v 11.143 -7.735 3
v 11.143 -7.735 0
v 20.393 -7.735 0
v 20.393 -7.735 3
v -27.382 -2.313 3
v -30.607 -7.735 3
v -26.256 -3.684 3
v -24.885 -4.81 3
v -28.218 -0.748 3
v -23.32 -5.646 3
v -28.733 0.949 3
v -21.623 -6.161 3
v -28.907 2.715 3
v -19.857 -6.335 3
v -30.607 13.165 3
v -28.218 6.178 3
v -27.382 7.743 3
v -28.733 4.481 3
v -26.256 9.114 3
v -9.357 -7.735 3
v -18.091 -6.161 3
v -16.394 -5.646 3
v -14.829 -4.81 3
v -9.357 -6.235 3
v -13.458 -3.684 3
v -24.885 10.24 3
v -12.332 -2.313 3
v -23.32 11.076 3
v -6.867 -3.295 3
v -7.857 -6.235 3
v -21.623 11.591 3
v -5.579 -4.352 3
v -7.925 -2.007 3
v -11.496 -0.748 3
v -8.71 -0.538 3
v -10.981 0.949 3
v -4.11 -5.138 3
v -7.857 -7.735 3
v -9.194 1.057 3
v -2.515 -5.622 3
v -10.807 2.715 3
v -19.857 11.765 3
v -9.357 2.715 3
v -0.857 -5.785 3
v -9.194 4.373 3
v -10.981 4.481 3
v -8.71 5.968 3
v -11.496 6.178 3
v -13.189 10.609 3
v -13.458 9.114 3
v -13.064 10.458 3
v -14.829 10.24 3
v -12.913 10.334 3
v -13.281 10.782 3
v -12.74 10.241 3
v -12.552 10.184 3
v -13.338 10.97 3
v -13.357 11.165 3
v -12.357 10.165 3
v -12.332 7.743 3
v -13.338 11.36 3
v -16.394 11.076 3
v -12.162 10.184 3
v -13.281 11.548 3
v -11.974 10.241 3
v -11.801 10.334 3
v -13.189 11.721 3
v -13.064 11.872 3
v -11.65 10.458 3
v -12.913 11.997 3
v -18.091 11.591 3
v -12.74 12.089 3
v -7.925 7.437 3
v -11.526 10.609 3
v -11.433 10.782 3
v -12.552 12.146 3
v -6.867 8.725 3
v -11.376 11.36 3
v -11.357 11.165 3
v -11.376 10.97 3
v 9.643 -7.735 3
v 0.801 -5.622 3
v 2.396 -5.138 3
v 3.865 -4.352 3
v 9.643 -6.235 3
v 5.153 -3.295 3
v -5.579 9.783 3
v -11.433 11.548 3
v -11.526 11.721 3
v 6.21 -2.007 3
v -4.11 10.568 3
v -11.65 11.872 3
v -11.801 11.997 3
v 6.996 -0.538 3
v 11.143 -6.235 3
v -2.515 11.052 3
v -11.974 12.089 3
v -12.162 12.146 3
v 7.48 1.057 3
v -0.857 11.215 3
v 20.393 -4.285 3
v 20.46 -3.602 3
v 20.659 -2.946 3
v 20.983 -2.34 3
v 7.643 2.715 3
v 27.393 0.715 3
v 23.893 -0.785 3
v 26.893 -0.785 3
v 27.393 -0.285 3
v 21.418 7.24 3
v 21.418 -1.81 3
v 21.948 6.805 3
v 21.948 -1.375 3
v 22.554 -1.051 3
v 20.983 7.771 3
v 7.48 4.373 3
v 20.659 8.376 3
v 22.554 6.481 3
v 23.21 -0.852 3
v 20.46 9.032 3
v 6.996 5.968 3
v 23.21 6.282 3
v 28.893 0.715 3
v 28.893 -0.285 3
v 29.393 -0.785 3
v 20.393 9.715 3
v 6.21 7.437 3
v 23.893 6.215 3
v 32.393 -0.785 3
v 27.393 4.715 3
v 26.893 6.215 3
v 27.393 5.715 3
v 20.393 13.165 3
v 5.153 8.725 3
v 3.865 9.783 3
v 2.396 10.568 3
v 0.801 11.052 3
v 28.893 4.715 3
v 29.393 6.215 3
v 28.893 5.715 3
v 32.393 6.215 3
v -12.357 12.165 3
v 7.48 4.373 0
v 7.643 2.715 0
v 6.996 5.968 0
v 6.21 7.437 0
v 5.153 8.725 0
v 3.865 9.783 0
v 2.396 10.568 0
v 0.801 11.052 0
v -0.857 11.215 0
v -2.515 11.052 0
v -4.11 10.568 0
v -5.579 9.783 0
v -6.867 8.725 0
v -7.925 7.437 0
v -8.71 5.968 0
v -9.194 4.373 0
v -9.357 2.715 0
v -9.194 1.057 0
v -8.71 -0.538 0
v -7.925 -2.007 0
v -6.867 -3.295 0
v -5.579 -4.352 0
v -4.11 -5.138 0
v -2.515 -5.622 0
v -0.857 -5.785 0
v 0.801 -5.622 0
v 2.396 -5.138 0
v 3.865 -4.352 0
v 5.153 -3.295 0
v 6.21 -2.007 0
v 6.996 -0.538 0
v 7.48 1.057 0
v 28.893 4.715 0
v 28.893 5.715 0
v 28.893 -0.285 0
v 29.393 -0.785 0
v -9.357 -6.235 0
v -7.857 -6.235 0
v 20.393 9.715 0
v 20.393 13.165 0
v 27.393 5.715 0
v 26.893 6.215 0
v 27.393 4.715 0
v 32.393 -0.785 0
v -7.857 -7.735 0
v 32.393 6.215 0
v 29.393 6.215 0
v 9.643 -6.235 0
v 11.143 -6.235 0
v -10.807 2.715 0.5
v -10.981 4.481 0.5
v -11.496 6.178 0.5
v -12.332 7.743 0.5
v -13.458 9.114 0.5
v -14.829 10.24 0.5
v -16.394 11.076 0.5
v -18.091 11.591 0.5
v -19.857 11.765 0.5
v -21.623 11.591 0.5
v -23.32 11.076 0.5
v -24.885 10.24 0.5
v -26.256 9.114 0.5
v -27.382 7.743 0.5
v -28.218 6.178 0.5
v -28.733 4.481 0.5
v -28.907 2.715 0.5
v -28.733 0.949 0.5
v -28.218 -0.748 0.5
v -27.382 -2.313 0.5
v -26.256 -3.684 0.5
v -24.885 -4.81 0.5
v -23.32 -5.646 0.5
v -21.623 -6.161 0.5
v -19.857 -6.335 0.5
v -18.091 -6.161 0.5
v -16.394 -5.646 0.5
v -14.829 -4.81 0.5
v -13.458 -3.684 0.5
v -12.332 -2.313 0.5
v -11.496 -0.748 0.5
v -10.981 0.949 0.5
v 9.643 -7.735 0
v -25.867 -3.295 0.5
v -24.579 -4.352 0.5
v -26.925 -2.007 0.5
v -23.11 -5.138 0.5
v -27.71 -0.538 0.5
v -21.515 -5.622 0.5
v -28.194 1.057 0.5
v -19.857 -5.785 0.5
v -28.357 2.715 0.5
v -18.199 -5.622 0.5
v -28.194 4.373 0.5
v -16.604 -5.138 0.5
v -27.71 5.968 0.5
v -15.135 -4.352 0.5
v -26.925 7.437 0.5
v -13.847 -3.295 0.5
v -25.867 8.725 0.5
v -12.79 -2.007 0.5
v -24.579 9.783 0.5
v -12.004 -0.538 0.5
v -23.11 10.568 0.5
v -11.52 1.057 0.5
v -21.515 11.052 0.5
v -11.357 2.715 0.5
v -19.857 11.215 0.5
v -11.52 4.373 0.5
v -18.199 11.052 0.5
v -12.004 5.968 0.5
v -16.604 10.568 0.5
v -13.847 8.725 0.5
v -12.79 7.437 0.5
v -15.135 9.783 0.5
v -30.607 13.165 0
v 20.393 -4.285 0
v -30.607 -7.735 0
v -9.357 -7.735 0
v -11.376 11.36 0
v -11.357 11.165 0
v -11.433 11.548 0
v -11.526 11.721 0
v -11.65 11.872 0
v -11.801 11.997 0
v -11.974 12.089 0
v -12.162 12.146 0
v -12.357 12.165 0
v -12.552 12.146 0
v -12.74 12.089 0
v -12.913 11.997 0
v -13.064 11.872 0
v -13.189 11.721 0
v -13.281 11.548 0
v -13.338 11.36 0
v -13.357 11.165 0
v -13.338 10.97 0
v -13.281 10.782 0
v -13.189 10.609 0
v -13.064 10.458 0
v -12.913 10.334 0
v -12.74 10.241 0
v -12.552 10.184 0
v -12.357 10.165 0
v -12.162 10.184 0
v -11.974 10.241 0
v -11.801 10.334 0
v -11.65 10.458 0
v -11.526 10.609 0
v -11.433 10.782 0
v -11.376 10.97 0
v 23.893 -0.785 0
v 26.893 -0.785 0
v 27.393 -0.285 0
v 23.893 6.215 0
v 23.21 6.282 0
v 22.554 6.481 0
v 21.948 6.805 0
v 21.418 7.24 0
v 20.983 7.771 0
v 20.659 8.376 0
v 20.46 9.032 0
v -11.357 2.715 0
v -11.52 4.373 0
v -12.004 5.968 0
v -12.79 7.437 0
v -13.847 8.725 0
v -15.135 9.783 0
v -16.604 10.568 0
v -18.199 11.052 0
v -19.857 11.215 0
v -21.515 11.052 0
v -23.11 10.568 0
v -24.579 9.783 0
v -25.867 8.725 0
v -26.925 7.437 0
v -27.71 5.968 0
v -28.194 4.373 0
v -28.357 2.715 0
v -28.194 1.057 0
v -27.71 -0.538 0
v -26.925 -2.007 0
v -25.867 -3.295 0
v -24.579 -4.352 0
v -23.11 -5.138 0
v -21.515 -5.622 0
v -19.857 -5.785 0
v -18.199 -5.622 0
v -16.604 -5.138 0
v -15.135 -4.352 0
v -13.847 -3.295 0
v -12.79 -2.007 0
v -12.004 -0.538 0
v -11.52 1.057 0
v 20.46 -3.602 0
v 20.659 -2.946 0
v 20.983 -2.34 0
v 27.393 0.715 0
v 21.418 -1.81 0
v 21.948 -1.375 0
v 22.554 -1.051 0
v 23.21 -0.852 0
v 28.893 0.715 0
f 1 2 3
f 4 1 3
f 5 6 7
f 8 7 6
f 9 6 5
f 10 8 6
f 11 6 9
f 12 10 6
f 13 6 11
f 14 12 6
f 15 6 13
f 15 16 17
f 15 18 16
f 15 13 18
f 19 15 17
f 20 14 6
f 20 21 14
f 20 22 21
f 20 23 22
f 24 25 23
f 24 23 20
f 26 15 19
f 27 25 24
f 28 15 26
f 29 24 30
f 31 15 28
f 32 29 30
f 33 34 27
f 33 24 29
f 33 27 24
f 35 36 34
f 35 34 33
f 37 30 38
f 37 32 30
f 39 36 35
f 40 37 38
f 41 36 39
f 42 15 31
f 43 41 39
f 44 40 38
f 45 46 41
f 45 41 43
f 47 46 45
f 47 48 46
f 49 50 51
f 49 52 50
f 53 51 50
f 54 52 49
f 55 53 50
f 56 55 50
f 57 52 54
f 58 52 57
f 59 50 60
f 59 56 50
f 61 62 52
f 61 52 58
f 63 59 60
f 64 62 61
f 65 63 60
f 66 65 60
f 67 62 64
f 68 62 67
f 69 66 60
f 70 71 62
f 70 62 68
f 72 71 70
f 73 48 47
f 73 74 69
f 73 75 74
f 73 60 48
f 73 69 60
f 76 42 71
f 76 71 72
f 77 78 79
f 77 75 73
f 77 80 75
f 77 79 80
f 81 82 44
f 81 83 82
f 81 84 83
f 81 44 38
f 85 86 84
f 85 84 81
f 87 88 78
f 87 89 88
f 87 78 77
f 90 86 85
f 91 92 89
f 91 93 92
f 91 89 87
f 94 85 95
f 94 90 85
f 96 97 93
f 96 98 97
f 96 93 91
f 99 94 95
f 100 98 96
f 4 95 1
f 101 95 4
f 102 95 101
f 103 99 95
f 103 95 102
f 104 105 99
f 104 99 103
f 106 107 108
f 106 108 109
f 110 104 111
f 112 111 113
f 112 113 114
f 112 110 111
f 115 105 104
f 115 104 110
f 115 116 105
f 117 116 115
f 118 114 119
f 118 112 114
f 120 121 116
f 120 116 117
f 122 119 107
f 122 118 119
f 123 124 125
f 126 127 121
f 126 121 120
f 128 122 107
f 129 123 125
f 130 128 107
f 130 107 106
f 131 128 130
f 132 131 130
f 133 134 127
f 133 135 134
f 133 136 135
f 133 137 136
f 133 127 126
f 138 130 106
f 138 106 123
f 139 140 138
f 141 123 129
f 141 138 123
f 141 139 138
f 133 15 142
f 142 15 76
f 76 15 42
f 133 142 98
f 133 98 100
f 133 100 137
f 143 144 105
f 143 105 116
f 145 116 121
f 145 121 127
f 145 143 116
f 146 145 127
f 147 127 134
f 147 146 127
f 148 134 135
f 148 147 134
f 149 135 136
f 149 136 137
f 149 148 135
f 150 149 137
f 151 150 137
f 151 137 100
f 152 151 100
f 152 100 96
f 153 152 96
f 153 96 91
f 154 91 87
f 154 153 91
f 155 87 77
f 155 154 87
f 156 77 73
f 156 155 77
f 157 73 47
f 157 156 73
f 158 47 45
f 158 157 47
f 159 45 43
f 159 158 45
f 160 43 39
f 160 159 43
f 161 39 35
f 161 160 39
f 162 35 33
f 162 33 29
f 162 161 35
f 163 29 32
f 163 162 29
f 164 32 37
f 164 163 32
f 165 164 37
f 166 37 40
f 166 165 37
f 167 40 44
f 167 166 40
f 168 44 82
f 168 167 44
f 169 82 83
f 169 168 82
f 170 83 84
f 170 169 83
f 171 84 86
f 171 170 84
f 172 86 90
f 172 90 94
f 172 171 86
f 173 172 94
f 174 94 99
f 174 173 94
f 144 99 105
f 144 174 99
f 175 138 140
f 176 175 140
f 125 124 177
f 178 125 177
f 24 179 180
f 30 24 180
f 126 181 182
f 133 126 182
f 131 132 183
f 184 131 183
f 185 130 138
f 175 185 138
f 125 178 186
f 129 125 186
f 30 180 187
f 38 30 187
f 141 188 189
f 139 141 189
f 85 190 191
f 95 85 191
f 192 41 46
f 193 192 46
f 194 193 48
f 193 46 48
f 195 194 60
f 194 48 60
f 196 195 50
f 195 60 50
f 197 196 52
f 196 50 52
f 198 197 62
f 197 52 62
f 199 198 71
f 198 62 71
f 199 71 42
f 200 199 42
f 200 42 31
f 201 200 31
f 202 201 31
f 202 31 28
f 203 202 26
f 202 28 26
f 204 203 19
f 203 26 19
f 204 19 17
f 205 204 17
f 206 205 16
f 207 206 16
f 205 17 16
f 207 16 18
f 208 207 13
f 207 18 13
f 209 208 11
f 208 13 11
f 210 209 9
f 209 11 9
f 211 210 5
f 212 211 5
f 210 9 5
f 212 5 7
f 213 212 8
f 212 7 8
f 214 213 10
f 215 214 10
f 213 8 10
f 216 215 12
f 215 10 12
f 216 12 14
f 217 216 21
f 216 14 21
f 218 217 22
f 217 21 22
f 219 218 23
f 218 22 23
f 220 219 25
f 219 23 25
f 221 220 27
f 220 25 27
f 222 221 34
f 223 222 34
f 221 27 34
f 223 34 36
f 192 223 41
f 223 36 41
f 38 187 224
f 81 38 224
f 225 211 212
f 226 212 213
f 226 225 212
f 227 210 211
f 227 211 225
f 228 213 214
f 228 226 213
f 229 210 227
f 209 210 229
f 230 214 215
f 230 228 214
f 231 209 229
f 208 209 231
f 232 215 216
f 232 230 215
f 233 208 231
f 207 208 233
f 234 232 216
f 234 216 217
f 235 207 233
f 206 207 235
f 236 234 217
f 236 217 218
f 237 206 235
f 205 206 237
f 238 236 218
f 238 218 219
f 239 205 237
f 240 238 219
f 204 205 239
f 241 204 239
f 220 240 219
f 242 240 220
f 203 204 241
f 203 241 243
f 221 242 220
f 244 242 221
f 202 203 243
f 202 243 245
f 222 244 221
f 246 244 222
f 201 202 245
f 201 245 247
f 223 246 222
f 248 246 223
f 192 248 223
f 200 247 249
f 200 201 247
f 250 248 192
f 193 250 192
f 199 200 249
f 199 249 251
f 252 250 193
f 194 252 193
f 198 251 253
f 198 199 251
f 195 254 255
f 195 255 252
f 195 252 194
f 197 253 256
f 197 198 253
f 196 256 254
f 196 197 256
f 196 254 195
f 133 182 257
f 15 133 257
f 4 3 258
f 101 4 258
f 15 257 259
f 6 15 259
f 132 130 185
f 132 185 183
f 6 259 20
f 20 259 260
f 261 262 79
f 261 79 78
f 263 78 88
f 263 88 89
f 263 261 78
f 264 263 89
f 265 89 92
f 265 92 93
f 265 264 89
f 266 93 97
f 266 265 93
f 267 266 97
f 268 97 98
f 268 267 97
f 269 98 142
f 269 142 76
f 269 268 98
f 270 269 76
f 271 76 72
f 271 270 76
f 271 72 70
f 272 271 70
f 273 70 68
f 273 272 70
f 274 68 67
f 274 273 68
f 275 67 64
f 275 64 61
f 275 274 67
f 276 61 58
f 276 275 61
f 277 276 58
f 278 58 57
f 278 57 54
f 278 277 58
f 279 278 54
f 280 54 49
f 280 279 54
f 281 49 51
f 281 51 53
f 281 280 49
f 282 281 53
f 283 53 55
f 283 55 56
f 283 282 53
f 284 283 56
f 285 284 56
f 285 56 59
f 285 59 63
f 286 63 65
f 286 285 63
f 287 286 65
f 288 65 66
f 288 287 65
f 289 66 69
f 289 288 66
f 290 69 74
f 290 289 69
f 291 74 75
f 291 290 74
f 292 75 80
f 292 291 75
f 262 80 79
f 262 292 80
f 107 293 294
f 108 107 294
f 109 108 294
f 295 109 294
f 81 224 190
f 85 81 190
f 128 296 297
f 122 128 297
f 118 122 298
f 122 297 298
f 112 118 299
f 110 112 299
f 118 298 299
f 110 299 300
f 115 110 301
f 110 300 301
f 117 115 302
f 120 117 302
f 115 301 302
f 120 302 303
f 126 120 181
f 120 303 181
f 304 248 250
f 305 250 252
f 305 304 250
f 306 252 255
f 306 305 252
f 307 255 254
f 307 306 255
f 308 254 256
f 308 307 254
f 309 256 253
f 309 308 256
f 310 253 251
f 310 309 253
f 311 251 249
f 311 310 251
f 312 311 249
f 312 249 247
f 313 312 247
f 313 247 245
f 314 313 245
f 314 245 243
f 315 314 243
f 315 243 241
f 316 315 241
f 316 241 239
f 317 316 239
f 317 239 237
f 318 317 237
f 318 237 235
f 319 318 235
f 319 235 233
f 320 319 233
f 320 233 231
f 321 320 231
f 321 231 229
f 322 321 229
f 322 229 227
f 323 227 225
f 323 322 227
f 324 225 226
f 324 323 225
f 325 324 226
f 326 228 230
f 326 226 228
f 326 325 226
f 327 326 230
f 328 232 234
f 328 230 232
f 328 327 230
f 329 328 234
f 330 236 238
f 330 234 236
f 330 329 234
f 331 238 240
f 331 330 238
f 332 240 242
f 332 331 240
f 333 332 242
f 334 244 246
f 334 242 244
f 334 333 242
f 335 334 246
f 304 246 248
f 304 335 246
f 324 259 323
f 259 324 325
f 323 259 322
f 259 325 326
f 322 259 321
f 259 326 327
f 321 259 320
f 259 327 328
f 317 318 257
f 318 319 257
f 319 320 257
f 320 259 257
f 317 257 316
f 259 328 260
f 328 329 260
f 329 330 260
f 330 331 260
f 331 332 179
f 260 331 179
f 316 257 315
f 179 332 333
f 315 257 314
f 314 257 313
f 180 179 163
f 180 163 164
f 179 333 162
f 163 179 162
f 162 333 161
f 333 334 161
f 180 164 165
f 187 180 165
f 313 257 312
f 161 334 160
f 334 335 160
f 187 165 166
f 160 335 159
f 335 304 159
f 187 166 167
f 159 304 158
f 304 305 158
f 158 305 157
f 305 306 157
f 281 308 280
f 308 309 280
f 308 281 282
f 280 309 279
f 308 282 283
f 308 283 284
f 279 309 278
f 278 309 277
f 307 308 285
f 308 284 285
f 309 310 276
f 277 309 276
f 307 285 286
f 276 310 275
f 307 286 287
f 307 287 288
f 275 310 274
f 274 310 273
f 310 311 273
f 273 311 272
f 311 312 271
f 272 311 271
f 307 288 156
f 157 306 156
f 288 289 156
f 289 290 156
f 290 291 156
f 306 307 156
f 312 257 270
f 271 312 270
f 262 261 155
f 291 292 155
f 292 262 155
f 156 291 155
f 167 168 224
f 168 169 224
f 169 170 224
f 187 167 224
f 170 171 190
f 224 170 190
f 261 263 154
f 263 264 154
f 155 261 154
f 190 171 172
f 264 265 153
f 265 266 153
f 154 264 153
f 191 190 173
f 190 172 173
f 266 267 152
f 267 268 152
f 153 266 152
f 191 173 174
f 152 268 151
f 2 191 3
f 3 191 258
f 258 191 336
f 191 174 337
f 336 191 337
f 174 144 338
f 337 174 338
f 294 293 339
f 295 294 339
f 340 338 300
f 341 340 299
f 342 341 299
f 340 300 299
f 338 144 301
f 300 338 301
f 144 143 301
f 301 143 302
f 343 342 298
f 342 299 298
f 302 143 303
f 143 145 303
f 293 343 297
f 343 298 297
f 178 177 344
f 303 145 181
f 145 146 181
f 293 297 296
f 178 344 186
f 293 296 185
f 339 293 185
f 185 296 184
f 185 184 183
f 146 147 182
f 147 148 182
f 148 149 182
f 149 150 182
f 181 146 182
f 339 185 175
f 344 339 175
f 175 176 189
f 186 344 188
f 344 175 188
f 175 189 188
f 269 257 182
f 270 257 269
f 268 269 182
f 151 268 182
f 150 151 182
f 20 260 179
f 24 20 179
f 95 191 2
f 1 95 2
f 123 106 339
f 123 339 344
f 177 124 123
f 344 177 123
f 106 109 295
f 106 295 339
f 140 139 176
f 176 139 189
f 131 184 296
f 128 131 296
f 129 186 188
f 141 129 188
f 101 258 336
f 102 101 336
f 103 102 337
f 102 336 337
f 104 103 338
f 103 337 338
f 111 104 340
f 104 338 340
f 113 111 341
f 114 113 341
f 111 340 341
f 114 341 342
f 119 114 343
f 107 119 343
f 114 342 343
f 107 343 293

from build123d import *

# Parameters (mm, degrees)
F0_R     = 8.5
F0_R_2   = 1
F1_DEPTH = 3
F2_R     = 9.05
F3_DEPTH = 2.5
F4_W     = 1.5
F4_H     = 1.5
F5_DEPTH = 3
F6_SIZE  = 0.5


with BuildPart() as f1:
    # F0 (on Top) → F1 (new body)
    with BuildSketch(Plane.XY):
        with BuildLine():
            Line((20.3929555267, 13.1650441562), (-30.6070444733, 13.1650441562))
            Line((-30.6070444733, 13.1650441562), (-30.6070444733, -7.7349558438))
            Line((-30.6070444733, -7.7349558438), (-9.3570444733, -7.7349558438))
            Line((-9.3570444733, -7.7349558438), (-9.3570444733, -6.2349558438))
            Line((-9.3570444733, -6.2349558438), (-7.8570444733, -6.2349558438))
            Line((-7.8570444733, -6.2349558438), (-7.8570444733, -7.7349558438))
            Line((-7.8570444733, -7.7349558438), (9.6429555267, -7.7349558438))
            Line((9.6429555267, -7.7349558438), (9.6429555267, -6.2349558438))
            Line((9.6429555267, -6.2349558438), (11.1429555267, -6.2349558438))
            Line((11.1429555267, -6.2349558438), (11.1429555267, -7.7349558438))
            Line((11.1429555267, -7.7349558438), (20.3929555267, -7.7349558438))
            Line((20.3929555267, -7.7349558438), (20.3929555267, -4.2849558438))
            ThreePointArc((20.3929555267, -4.2849558438), (21.4180817926, -1.8100821097), (23.8929555267, -0.7849558438))
            Line((23.8929555267, -0.7849558438), (32.3929555267, -0.7849558438))
            Line((32.3929555267, -0.7849558438), (32.3929555267, 6.2150441562))
            Line((32.3929555267, 6.2150441562), (23.8929555267, 6.2150441562))
            ThreePointArc((23.8929555267, 6.2150441562), (21.4180817926, 7.240170422), (20.3929555267, 9.7150441562))
            Line((20.3929555267, 9.7150441562), (20.3929555267, 13.1650441562))
        make_face()
        with Locations((-0.8570444733, 2.7150441562)):
            Circle(F0_R, mode=Mode.SUBTRACT)
        with Locations((-19.8570444733, 2.7150441562)):
            Circle(F0_R, mode=Mode.SUBTRACT)
        with Locations((-12.3570444733, 11.1650441562)):
            Circle(F0_R_2, mode=Mode.SUBTRACT)
    extrude(amount=F1_DEPTH)

    # F2 (on face) → F3 (cut)
    with BuildSketch(Plane.XY.offset(3)):
        with Locations((-19.8570444733, 2.7150441562)):
            Circle(F2_R)
    extrude(amount=-F3_DEPTH, mode=Mode.SUBTRACT)

    # F4 (on face) → F5 (cut)
    with BuildSketch(Plane.XY.offset(3)):
        with Locations((28.1429555267, -0.0349558438)):
            Rectangle(F4_W, F4_H)
        with Locations((28.1429555267, 5.4650441562)):
            Rectangle(F4_W, F4_H)
    extrude(amount=-F5_DEPTH, mode=Mode.SUBTRACT)

    # F6
    f6_edges = [f1.edges().sort_by_distance(p)[0] for p in [
        (27.392956, -0.784956, 1.5),
        (28.892956, -0.784956, 1.5),
        (28.892956, 6.215044, 1.5),
        (27.392956, 6.215044, 1.5),
    ]]
    chamfer(f6_edges, length=F6_SIZE)


solid = f1.part
